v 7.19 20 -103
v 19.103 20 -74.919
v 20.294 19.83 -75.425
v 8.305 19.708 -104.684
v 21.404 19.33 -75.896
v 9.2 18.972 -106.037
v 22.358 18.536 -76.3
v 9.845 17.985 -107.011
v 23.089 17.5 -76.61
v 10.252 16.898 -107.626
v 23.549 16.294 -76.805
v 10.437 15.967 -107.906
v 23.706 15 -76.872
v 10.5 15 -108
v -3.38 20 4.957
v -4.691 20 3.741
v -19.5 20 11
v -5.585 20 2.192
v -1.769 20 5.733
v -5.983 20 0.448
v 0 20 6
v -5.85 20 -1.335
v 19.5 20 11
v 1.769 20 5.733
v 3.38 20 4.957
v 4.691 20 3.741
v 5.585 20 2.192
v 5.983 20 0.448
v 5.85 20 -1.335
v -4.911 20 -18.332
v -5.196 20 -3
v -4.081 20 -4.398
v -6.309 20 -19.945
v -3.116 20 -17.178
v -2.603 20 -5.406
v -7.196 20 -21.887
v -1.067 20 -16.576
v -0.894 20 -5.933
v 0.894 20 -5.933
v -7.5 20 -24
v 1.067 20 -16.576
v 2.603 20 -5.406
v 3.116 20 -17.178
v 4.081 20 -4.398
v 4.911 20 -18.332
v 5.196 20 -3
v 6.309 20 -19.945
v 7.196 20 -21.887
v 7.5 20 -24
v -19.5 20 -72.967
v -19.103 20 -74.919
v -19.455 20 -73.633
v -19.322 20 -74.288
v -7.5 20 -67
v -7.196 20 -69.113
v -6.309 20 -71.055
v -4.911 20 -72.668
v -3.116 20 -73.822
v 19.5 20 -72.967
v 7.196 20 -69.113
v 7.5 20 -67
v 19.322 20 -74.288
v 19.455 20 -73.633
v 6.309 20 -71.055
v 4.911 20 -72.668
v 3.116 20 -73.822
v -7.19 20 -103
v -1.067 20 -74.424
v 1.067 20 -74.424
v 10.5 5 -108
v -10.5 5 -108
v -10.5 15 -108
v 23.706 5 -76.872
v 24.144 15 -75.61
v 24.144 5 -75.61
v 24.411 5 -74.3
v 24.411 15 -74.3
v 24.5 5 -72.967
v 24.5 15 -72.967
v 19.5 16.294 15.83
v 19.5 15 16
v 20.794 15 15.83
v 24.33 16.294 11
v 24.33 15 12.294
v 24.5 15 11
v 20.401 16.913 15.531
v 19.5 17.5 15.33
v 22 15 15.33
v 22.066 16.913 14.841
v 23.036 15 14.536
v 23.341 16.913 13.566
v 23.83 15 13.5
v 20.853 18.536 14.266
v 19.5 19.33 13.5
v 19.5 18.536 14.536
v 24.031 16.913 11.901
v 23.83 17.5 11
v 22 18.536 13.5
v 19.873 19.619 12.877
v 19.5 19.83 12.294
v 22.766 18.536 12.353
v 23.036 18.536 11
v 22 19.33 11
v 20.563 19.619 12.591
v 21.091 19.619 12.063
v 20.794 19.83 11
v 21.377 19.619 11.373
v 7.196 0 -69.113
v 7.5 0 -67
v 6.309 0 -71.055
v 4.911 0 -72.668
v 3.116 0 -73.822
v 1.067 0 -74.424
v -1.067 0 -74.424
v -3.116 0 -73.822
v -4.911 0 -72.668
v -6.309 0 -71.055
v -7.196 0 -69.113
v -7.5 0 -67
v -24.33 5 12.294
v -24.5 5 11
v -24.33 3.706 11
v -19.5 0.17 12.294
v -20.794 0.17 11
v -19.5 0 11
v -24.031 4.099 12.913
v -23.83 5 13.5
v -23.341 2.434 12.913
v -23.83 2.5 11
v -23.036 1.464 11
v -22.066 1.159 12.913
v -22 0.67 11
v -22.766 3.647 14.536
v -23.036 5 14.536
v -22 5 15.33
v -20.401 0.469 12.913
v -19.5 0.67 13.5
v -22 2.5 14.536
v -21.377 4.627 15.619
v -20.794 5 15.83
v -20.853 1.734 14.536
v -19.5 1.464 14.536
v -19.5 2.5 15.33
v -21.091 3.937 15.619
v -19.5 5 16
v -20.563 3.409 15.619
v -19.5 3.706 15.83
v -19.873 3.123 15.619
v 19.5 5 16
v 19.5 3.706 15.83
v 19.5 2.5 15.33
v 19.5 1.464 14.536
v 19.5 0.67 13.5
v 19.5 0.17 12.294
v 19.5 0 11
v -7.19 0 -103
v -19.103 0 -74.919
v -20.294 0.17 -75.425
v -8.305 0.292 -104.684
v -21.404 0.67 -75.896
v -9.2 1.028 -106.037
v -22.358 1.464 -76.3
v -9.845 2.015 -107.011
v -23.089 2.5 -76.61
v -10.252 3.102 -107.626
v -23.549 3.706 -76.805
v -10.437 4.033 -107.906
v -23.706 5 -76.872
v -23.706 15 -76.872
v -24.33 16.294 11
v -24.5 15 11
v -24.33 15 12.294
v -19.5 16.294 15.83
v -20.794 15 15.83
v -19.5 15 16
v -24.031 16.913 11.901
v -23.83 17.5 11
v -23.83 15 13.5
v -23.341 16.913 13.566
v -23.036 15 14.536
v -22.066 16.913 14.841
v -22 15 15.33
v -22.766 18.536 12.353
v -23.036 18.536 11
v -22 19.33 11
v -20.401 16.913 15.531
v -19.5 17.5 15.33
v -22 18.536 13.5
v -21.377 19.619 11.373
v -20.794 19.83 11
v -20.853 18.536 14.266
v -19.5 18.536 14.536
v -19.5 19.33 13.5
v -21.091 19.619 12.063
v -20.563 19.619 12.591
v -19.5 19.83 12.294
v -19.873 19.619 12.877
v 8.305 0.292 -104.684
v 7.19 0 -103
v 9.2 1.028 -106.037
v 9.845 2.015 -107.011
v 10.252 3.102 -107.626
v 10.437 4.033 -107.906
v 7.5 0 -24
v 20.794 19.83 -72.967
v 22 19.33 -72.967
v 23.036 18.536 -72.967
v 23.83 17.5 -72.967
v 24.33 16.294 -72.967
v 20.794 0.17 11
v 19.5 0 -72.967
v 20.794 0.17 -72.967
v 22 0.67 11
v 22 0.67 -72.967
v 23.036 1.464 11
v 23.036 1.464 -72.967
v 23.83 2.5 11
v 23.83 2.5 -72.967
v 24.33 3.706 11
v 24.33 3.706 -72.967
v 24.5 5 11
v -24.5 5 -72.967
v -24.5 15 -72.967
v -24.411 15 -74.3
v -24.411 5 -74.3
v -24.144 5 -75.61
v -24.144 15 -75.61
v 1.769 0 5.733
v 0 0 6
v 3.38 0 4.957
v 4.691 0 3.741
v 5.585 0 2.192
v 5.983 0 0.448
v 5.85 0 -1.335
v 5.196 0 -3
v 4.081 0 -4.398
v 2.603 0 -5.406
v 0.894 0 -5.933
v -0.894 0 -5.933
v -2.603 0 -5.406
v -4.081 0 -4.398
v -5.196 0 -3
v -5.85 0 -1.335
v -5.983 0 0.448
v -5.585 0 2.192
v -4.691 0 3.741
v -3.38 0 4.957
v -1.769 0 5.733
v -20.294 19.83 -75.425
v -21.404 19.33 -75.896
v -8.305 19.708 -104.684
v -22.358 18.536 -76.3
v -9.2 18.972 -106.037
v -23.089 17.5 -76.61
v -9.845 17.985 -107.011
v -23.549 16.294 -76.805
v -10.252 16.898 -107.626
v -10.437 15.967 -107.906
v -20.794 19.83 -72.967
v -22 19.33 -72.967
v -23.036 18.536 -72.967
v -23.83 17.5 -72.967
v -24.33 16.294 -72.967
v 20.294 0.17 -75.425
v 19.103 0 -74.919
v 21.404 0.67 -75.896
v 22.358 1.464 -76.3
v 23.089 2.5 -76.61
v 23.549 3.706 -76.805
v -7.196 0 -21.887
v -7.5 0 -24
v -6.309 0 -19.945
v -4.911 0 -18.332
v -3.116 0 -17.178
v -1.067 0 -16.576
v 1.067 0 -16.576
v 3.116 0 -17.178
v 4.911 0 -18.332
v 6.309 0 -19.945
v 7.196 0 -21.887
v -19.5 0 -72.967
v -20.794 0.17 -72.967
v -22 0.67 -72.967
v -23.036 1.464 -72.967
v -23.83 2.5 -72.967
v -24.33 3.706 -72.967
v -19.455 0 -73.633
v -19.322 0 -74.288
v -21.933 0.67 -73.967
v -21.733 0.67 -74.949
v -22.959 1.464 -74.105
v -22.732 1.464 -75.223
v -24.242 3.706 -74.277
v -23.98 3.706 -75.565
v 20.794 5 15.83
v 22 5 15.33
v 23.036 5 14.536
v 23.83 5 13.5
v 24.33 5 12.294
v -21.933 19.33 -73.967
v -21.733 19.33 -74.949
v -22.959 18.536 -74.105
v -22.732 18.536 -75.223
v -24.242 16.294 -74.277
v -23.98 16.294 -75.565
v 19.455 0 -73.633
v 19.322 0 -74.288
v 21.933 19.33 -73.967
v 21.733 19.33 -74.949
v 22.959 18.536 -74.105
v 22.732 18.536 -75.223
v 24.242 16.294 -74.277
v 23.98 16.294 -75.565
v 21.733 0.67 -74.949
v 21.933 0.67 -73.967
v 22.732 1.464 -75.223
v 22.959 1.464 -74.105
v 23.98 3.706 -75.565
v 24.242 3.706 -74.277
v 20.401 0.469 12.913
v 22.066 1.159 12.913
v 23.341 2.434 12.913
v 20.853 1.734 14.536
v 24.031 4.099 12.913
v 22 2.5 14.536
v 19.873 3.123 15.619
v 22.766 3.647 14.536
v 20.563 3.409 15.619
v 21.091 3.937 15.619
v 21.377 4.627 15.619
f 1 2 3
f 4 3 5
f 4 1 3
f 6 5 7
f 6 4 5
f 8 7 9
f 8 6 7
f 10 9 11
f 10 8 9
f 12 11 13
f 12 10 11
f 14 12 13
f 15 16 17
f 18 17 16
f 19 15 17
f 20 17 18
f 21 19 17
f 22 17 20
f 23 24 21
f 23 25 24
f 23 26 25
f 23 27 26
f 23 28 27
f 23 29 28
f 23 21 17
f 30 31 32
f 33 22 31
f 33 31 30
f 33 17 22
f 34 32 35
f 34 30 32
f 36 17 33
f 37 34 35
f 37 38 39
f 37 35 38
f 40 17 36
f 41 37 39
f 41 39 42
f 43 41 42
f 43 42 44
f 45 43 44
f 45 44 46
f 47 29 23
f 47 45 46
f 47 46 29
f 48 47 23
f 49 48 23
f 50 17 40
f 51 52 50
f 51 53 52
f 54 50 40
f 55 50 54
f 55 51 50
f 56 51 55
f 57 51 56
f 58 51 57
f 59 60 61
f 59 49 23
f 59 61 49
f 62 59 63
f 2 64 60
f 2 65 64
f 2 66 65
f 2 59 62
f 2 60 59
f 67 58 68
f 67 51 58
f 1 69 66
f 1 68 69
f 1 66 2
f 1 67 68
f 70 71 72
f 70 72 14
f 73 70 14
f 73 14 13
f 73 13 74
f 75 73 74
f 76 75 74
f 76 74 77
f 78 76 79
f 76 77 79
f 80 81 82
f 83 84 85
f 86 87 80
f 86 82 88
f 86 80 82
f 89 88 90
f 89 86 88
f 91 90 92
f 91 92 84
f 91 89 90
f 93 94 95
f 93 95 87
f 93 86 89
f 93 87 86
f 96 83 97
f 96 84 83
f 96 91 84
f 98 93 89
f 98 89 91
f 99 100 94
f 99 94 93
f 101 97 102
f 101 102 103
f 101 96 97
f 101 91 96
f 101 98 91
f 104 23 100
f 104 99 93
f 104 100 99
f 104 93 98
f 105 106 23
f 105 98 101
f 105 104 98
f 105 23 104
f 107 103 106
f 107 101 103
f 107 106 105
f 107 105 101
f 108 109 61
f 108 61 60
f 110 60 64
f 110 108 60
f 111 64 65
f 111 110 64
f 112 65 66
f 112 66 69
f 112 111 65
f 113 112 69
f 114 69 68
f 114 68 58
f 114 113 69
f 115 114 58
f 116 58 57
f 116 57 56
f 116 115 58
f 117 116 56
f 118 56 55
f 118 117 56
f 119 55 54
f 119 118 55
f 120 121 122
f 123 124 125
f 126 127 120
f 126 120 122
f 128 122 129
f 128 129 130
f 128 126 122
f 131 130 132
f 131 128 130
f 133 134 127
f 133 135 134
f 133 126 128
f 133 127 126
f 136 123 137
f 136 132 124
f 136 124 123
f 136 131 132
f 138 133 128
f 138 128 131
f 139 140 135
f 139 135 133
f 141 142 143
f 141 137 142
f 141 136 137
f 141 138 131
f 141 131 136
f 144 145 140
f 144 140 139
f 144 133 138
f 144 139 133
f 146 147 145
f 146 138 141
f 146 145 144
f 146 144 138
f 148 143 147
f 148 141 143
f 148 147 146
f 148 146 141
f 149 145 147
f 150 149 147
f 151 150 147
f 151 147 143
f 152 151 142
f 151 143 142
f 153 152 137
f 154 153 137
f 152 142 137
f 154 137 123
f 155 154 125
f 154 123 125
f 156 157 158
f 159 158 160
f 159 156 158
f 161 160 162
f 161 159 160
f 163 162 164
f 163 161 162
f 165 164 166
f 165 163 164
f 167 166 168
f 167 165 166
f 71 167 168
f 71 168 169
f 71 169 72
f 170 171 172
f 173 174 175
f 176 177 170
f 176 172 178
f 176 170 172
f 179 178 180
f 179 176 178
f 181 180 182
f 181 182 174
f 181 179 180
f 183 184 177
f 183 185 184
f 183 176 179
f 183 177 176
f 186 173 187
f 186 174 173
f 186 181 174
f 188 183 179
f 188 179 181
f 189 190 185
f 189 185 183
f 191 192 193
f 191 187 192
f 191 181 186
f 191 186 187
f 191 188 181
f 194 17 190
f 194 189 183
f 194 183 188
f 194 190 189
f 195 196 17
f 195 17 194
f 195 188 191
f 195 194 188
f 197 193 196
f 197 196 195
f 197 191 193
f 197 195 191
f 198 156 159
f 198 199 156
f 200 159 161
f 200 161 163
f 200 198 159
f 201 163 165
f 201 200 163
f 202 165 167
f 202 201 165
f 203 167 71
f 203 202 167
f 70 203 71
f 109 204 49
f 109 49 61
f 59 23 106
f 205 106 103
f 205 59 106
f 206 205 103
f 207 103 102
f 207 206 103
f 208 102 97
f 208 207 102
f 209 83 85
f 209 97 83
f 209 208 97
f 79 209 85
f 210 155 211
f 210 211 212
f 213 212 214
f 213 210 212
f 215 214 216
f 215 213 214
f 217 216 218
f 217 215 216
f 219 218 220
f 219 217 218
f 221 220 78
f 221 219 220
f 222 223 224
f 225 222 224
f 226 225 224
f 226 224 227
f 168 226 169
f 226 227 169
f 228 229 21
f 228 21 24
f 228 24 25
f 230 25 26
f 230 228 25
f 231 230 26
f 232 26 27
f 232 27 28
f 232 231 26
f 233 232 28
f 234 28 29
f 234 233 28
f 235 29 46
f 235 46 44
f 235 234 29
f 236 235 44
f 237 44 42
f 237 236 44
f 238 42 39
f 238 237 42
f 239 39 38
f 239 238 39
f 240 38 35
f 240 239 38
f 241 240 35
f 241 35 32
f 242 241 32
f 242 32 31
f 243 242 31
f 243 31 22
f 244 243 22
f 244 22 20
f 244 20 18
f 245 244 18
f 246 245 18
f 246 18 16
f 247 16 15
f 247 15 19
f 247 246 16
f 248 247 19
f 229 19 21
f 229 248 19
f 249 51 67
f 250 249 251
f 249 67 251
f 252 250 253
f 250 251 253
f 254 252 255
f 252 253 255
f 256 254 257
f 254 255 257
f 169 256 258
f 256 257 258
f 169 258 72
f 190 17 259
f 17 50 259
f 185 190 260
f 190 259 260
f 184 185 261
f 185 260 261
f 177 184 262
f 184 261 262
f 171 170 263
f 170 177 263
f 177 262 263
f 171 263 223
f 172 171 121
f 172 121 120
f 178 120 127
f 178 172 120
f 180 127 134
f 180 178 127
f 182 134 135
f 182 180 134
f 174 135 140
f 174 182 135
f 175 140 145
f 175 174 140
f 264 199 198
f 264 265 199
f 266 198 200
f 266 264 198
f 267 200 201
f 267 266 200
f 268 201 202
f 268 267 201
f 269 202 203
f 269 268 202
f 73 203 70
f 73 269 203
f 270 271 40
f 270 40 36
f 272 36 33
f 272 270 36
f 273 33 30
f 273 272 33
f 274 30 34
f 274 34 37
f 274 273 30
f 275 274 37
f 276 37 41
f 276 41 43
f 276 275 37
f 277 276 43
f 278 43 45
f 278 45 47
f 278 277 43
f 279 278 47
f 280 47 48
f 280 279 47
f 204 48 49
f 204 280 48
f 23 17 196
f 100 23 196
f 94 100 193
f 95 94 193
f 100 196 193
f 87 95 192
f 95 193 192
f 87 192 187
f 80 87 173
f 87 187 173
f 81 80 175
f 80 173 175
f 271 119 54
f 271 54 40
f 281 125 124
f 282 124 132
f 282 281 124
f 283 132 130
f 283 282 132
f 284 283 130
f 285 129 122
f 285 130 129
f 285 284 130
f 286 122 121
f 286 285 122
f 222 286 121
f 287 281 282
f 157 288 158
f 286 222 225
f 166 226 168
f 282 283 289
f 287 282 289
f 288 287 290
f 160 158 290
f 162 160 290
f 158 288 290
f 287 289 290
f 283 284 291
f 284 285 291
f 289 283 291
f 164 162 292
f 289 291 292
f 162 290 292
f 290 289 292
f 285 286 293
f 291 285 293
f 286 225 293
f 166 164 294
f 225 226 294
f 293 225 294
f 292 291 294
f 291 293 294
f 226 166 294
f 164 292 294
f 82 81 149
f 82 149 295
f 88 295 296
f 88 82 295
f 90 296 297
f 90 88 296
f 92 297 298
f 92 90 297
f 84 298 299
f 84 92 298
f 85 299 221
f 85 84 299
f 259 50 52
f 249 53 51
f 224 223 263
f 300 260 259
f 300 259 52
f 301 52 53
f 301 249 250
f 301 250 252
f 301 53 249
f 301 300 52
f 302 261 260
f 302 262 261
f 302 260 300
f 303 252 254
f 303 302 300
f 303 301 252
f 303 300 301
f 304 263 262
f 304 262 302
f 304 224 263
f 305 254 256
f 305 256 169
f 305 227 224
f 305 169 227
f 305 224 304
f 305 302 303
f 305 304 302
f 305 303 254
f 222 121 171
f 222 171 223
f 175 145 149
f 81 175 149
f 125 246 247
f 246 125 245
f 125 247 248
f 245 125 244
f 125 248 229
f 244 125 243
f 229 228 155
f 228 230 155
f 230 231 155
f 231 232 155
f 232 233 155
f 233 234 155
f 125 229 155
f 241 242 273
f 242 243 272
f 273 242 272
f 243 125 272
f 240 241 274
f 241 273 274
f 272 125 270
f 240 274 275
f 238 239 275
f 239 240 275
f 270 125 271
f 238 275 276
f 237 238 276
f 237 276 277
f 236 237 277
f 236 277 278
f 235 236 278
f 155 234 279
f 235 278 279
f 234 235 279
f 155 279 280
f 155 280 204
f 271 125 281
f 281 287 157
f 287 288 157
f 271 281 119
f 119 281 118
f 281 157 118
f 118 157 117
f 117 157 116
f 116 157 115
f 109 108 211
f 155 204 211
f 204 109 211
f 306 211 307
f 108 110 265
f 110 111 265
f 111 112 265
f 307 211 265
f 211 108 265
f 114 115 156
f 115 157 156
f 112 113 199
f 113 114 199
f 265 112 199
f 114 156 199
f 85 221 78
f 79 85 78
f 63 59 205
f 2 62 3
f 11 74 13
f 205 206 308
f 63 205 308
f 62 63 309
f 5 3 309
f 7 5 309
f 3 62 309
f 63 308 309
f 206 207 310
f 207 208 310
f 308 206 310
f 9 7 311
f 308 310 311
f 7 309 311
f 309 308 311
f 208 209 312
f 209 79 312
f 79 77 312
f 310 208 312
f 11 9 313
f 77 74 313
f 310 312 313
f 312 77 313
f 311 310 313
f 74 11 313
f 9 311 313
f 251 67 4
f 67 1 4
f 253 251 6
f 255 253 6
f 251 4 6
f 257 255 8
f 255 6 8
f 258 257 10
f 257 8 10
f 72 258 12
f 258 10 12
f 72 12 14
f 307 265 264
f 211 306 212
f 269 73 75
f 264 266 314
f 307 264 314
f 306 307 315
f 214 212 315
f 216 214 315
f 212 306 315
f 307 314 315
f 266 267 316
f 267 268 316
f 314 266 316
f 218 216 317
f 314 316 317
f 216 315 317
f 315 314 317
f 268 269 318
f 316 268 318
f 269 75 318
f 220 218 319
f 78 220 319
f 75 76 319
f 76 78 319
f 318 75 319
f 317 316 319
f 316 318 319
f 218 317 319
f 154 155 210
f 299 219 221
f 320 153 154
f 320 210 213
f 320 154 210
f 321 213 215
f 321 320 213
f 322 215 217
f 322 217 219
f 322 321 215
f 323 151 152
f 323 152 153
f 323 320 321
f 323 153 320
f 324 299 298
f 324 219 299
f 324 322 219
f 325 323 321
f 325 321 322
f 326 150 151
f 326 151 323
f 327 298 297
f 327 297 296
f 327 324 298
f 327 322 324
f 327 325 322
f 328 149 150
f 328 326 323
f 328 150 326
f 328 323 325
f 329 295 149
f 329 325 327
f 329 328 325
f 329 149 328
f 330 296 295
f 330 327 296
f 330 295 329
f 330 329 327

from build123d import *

# Parameters (mm, degrees)
SKETCH_1_W      = 49
SKETCH_1_H      = 32
SKETCH_1_R      = 6
EXTRUDE_1_DEPTH = 20
SKETCH_3_W      = 49
SKETCH_3_H      = 59
EXTRUDE_2_DEPTH = 20
FILLET_1_R      = 10
FILLET_2_R      = 5
FILLET_3_R      = 5
FILLET_4_R      = 5


with BuildPart() as part:
    # 草图1 → 凸台-拉伸1 (new body)
    with BuildSketch(Plane(origin=(0, 0, 0), x_dir=(1, 0, 0), z_dir=(0, 1, 0))):
        Rectangle(SKETCH_1_W, SKETCH_1_H)
        with Locations(Location((0, 0, 0), (0, 0, 270))):
            Circle(SKETCH_1_R, mode=Mode.SUBTRACT)
    extrude(amount=EXTRUDE_1_DEPTH)

    # 草图3 → 凸台-拉伸2 (add)
    # profile 1 of 2: a face of its own
    with BuildSketch(Plane(origin=(0, 0, 0), x_dir=(1, 0, 0), z_dir=(0, 1, 0))):
        with Locations((0, 45.5)):
            Rectangle(SKETCH_3_W, SKETCH_3_H)
        with BuildLine():
            ThreePointArc((-7.5, 24), (0, 16.5), (7.5, 24))
            Line((7.5, 24), (7.5, 67))
            ThreePointArc((7.5, 67), (0, 74.5), (-7.5, 67))
            Line((-7.5, 67), (-7.5, 24))
        make_face(mode=Mode.SUBTRACT)
    # profile 2 of 2: a face of its own
    with BuildSketch(Plane(origin=(0, 0, 0), x_dir=(1, 0, 0), z_dir=(0, 1, 0))):
        Polygon((10.5, 108), (24.5, 75), (-24.5, 75), (-10.5, 108), align=None)
    extrude(amount=EXTRUDE_2_DEPTH)

    # 圆角1
    fillet_1_edges = [part.edges().sort_by_distance(p)[0] for p in [
        (-24.5, 10, -75),
        (24.5, 10, -75),
    ]]
    fillet(fillet_1_edges, radius=FILLET_1_R)

    # 圆角2
    fillet_2_edges = [part.edges().sort_by_distance(p)[0] for p in [
        (24.5, 20, -28.483251194),
        (17.102908909, 20, -92.436000428),
        (0, 20, -108),
        (-17.102908909, 0, -92.436000428),
        (-17.102908909, 20, -92.436000428),
        (0, 0, -108),
        (17.102908909, 0, -92.436000428),
        (-24.5, 0, -28.483251194),
        (-24.299443305, 0, -74.959216844),
        (24.299443305, 0, -74.959216844),
        (-24.5, 20, -28.483251194),
        (-24.299443305, 20, -74.959216844),
        (24.299443305, 20, -74.959216844),
        (24.5, 0, -28.483251194),
        (24.5, 10, 16),
        (-24.5, 10, 16),
    ]]
    fillet(fillet_2_edges, radius=FILLET_2_R)

    # 圆角3
    # the kernel refuses this fillet: 5 mm, written as the material it takes off along each edge
    with BuildSketch(Plane(origin=(-19.5, 15, 11), x_dir=(0, 0, 1), z_dir=(0, 1, 0))) as fillet_3_piece_1_section:
        Polygon((0, 0), (FILLET_3_R, 0), (FILLET_3_R, -FILLET_3_R), (0, -FILLET_3_R), align=None)
    fillet_3_piece_1 = extrude(amount=FILLET_3_R, mode=Mode.PRIVATE)
    fillet_3_piece_1 = fillet_3_piece_1 - Plane(origin=(-19.5, 15, 11), x_dir=(0.7071067811865475, 0, -0.7071067811865475), z_dir=(0, 1, 0)) * Sphere(FILLET_3_R, mode=Mode.PRIVATE)
    add(fillet_3_piece_1, mode=Mode.SUBTRACT)
    with BuildSketch(Plane(origin=(19.5, 15, 11), x_dir=(0, 0, 1), z_dir=(0, 1, 0))) as fillet_3_piece_2_section:
        Polygon((0, 0), (FILLET_3_R, 0), (FILLET_3_R, FILLET_3_R), (0, FILLET_3_R), align=None)
    fillet_3_piece_2 = extrude(amount=FILLET_3_R, mode=Mode.PRIVATE)
    fillet_3_piece_2 = fillet_3_piece_2 - Plane(origin=(19.5, 15, 11), x_dir=(-0.7071067811865475, 0, -0.7071067811865475), z_dir=(0, 1, 0)) * Sphere(FILLET_3_R, mode=Mode.PRIVATE)
    add(fillet_3_piece_2, mode=Mode.SUBTRACT)
    with BuildSketch(Plane(origin=(-19.5, 20, 16), x_dir=(0, 0, -1), z_dir=(1, 0, 0))) as fillet_3_piece_3:
        with BuildLine():
            CenterArc((FILLET_3_R, -FILLET_3_R), FILLET_3_R, 90, 90)
            Line((0, -FILLET_3_R), (0, 0))
            Line((0, 0), (FILLET_3_R, 0))
        make_face()
    extrude(amount=39, mode=Mode.SUBTRACT)

    # 圆角4
    # the kernel refuses this fillet: 5 mm, written as the material it takes off along each edge
    with BuildSketch(Plane(origin=(-19.5, 5, 11), x_dir=(0, -1, 0), z_dir=(0, 0, 1))) as fillet_4_piece_1_section:
        Polygon((0, 0), (FILLET_4_R, 0), (FILLET_4_R, -FILLET_4_R), (0, -FILLET_4_R), align=None)
    fillet_4_piece_1 = extrude(amount=FILLET_4_R, mode=Mode.PRIVATE)
    fillet_4_piece_1 = fillet_4_piece_1 - Plane(origin=(-19.5, 5, 11), x_dir=(0.7071067811865475, 0.7071067811865475, 0), z_dir=(0, 0, 1)) * Sphere(FILLET_4_R, mode=Mode.PRIVATE)
    add(fillet_4_piece_1, mode=Mode.SUBTRACT)
    with BuildSketch(Plane(origin=(19.5, 5, 11), x_dir=(0, -1, 0), z_dir=(0, 0, 1))) as fillet_4_piece_2_section:
        Polygon((0, 0), (FILLET_4_R, 0), (FILLET_4_R, FILLET_4_R), (0, FILLET_4_R), align=None)
    fillet_4_piece_2 = extrude(amount=FILLET_4_R, mode=Mode.PRIVATE)
    fillet_4_piece_2 = fillet_4_piece_2 - Plane(origin=(19.5, 5, 11), x_dir=(-0.7071067811865475, 0.7071067811865475, 0), z_dir=(0, 0, 1)) * Sphere(FILLET_4_R, mode=Mode.PRIVATE)
    add(fillet_4_piece_2, mode=Mode.SUBTRACT)
    with BuildSketch(Plane(origin=(-19.5, 0, 16), x_dir=(0, 1, 0), z_dir=(1, 0, 0))) as fillet_4_piece_3:
        with BuildLine():
            CenterArc((FILLET_4_R, -FILLET_4_R), FILLET_4_R, 90, 90)
            Line((0, -FILLET_4_R), (0, 0))
            Line((0, 0), (FILLET_4_R, 0))
        make_face()
    extrude(amount=39, mode=Mode.SUBTRACT)


solid = part.part
